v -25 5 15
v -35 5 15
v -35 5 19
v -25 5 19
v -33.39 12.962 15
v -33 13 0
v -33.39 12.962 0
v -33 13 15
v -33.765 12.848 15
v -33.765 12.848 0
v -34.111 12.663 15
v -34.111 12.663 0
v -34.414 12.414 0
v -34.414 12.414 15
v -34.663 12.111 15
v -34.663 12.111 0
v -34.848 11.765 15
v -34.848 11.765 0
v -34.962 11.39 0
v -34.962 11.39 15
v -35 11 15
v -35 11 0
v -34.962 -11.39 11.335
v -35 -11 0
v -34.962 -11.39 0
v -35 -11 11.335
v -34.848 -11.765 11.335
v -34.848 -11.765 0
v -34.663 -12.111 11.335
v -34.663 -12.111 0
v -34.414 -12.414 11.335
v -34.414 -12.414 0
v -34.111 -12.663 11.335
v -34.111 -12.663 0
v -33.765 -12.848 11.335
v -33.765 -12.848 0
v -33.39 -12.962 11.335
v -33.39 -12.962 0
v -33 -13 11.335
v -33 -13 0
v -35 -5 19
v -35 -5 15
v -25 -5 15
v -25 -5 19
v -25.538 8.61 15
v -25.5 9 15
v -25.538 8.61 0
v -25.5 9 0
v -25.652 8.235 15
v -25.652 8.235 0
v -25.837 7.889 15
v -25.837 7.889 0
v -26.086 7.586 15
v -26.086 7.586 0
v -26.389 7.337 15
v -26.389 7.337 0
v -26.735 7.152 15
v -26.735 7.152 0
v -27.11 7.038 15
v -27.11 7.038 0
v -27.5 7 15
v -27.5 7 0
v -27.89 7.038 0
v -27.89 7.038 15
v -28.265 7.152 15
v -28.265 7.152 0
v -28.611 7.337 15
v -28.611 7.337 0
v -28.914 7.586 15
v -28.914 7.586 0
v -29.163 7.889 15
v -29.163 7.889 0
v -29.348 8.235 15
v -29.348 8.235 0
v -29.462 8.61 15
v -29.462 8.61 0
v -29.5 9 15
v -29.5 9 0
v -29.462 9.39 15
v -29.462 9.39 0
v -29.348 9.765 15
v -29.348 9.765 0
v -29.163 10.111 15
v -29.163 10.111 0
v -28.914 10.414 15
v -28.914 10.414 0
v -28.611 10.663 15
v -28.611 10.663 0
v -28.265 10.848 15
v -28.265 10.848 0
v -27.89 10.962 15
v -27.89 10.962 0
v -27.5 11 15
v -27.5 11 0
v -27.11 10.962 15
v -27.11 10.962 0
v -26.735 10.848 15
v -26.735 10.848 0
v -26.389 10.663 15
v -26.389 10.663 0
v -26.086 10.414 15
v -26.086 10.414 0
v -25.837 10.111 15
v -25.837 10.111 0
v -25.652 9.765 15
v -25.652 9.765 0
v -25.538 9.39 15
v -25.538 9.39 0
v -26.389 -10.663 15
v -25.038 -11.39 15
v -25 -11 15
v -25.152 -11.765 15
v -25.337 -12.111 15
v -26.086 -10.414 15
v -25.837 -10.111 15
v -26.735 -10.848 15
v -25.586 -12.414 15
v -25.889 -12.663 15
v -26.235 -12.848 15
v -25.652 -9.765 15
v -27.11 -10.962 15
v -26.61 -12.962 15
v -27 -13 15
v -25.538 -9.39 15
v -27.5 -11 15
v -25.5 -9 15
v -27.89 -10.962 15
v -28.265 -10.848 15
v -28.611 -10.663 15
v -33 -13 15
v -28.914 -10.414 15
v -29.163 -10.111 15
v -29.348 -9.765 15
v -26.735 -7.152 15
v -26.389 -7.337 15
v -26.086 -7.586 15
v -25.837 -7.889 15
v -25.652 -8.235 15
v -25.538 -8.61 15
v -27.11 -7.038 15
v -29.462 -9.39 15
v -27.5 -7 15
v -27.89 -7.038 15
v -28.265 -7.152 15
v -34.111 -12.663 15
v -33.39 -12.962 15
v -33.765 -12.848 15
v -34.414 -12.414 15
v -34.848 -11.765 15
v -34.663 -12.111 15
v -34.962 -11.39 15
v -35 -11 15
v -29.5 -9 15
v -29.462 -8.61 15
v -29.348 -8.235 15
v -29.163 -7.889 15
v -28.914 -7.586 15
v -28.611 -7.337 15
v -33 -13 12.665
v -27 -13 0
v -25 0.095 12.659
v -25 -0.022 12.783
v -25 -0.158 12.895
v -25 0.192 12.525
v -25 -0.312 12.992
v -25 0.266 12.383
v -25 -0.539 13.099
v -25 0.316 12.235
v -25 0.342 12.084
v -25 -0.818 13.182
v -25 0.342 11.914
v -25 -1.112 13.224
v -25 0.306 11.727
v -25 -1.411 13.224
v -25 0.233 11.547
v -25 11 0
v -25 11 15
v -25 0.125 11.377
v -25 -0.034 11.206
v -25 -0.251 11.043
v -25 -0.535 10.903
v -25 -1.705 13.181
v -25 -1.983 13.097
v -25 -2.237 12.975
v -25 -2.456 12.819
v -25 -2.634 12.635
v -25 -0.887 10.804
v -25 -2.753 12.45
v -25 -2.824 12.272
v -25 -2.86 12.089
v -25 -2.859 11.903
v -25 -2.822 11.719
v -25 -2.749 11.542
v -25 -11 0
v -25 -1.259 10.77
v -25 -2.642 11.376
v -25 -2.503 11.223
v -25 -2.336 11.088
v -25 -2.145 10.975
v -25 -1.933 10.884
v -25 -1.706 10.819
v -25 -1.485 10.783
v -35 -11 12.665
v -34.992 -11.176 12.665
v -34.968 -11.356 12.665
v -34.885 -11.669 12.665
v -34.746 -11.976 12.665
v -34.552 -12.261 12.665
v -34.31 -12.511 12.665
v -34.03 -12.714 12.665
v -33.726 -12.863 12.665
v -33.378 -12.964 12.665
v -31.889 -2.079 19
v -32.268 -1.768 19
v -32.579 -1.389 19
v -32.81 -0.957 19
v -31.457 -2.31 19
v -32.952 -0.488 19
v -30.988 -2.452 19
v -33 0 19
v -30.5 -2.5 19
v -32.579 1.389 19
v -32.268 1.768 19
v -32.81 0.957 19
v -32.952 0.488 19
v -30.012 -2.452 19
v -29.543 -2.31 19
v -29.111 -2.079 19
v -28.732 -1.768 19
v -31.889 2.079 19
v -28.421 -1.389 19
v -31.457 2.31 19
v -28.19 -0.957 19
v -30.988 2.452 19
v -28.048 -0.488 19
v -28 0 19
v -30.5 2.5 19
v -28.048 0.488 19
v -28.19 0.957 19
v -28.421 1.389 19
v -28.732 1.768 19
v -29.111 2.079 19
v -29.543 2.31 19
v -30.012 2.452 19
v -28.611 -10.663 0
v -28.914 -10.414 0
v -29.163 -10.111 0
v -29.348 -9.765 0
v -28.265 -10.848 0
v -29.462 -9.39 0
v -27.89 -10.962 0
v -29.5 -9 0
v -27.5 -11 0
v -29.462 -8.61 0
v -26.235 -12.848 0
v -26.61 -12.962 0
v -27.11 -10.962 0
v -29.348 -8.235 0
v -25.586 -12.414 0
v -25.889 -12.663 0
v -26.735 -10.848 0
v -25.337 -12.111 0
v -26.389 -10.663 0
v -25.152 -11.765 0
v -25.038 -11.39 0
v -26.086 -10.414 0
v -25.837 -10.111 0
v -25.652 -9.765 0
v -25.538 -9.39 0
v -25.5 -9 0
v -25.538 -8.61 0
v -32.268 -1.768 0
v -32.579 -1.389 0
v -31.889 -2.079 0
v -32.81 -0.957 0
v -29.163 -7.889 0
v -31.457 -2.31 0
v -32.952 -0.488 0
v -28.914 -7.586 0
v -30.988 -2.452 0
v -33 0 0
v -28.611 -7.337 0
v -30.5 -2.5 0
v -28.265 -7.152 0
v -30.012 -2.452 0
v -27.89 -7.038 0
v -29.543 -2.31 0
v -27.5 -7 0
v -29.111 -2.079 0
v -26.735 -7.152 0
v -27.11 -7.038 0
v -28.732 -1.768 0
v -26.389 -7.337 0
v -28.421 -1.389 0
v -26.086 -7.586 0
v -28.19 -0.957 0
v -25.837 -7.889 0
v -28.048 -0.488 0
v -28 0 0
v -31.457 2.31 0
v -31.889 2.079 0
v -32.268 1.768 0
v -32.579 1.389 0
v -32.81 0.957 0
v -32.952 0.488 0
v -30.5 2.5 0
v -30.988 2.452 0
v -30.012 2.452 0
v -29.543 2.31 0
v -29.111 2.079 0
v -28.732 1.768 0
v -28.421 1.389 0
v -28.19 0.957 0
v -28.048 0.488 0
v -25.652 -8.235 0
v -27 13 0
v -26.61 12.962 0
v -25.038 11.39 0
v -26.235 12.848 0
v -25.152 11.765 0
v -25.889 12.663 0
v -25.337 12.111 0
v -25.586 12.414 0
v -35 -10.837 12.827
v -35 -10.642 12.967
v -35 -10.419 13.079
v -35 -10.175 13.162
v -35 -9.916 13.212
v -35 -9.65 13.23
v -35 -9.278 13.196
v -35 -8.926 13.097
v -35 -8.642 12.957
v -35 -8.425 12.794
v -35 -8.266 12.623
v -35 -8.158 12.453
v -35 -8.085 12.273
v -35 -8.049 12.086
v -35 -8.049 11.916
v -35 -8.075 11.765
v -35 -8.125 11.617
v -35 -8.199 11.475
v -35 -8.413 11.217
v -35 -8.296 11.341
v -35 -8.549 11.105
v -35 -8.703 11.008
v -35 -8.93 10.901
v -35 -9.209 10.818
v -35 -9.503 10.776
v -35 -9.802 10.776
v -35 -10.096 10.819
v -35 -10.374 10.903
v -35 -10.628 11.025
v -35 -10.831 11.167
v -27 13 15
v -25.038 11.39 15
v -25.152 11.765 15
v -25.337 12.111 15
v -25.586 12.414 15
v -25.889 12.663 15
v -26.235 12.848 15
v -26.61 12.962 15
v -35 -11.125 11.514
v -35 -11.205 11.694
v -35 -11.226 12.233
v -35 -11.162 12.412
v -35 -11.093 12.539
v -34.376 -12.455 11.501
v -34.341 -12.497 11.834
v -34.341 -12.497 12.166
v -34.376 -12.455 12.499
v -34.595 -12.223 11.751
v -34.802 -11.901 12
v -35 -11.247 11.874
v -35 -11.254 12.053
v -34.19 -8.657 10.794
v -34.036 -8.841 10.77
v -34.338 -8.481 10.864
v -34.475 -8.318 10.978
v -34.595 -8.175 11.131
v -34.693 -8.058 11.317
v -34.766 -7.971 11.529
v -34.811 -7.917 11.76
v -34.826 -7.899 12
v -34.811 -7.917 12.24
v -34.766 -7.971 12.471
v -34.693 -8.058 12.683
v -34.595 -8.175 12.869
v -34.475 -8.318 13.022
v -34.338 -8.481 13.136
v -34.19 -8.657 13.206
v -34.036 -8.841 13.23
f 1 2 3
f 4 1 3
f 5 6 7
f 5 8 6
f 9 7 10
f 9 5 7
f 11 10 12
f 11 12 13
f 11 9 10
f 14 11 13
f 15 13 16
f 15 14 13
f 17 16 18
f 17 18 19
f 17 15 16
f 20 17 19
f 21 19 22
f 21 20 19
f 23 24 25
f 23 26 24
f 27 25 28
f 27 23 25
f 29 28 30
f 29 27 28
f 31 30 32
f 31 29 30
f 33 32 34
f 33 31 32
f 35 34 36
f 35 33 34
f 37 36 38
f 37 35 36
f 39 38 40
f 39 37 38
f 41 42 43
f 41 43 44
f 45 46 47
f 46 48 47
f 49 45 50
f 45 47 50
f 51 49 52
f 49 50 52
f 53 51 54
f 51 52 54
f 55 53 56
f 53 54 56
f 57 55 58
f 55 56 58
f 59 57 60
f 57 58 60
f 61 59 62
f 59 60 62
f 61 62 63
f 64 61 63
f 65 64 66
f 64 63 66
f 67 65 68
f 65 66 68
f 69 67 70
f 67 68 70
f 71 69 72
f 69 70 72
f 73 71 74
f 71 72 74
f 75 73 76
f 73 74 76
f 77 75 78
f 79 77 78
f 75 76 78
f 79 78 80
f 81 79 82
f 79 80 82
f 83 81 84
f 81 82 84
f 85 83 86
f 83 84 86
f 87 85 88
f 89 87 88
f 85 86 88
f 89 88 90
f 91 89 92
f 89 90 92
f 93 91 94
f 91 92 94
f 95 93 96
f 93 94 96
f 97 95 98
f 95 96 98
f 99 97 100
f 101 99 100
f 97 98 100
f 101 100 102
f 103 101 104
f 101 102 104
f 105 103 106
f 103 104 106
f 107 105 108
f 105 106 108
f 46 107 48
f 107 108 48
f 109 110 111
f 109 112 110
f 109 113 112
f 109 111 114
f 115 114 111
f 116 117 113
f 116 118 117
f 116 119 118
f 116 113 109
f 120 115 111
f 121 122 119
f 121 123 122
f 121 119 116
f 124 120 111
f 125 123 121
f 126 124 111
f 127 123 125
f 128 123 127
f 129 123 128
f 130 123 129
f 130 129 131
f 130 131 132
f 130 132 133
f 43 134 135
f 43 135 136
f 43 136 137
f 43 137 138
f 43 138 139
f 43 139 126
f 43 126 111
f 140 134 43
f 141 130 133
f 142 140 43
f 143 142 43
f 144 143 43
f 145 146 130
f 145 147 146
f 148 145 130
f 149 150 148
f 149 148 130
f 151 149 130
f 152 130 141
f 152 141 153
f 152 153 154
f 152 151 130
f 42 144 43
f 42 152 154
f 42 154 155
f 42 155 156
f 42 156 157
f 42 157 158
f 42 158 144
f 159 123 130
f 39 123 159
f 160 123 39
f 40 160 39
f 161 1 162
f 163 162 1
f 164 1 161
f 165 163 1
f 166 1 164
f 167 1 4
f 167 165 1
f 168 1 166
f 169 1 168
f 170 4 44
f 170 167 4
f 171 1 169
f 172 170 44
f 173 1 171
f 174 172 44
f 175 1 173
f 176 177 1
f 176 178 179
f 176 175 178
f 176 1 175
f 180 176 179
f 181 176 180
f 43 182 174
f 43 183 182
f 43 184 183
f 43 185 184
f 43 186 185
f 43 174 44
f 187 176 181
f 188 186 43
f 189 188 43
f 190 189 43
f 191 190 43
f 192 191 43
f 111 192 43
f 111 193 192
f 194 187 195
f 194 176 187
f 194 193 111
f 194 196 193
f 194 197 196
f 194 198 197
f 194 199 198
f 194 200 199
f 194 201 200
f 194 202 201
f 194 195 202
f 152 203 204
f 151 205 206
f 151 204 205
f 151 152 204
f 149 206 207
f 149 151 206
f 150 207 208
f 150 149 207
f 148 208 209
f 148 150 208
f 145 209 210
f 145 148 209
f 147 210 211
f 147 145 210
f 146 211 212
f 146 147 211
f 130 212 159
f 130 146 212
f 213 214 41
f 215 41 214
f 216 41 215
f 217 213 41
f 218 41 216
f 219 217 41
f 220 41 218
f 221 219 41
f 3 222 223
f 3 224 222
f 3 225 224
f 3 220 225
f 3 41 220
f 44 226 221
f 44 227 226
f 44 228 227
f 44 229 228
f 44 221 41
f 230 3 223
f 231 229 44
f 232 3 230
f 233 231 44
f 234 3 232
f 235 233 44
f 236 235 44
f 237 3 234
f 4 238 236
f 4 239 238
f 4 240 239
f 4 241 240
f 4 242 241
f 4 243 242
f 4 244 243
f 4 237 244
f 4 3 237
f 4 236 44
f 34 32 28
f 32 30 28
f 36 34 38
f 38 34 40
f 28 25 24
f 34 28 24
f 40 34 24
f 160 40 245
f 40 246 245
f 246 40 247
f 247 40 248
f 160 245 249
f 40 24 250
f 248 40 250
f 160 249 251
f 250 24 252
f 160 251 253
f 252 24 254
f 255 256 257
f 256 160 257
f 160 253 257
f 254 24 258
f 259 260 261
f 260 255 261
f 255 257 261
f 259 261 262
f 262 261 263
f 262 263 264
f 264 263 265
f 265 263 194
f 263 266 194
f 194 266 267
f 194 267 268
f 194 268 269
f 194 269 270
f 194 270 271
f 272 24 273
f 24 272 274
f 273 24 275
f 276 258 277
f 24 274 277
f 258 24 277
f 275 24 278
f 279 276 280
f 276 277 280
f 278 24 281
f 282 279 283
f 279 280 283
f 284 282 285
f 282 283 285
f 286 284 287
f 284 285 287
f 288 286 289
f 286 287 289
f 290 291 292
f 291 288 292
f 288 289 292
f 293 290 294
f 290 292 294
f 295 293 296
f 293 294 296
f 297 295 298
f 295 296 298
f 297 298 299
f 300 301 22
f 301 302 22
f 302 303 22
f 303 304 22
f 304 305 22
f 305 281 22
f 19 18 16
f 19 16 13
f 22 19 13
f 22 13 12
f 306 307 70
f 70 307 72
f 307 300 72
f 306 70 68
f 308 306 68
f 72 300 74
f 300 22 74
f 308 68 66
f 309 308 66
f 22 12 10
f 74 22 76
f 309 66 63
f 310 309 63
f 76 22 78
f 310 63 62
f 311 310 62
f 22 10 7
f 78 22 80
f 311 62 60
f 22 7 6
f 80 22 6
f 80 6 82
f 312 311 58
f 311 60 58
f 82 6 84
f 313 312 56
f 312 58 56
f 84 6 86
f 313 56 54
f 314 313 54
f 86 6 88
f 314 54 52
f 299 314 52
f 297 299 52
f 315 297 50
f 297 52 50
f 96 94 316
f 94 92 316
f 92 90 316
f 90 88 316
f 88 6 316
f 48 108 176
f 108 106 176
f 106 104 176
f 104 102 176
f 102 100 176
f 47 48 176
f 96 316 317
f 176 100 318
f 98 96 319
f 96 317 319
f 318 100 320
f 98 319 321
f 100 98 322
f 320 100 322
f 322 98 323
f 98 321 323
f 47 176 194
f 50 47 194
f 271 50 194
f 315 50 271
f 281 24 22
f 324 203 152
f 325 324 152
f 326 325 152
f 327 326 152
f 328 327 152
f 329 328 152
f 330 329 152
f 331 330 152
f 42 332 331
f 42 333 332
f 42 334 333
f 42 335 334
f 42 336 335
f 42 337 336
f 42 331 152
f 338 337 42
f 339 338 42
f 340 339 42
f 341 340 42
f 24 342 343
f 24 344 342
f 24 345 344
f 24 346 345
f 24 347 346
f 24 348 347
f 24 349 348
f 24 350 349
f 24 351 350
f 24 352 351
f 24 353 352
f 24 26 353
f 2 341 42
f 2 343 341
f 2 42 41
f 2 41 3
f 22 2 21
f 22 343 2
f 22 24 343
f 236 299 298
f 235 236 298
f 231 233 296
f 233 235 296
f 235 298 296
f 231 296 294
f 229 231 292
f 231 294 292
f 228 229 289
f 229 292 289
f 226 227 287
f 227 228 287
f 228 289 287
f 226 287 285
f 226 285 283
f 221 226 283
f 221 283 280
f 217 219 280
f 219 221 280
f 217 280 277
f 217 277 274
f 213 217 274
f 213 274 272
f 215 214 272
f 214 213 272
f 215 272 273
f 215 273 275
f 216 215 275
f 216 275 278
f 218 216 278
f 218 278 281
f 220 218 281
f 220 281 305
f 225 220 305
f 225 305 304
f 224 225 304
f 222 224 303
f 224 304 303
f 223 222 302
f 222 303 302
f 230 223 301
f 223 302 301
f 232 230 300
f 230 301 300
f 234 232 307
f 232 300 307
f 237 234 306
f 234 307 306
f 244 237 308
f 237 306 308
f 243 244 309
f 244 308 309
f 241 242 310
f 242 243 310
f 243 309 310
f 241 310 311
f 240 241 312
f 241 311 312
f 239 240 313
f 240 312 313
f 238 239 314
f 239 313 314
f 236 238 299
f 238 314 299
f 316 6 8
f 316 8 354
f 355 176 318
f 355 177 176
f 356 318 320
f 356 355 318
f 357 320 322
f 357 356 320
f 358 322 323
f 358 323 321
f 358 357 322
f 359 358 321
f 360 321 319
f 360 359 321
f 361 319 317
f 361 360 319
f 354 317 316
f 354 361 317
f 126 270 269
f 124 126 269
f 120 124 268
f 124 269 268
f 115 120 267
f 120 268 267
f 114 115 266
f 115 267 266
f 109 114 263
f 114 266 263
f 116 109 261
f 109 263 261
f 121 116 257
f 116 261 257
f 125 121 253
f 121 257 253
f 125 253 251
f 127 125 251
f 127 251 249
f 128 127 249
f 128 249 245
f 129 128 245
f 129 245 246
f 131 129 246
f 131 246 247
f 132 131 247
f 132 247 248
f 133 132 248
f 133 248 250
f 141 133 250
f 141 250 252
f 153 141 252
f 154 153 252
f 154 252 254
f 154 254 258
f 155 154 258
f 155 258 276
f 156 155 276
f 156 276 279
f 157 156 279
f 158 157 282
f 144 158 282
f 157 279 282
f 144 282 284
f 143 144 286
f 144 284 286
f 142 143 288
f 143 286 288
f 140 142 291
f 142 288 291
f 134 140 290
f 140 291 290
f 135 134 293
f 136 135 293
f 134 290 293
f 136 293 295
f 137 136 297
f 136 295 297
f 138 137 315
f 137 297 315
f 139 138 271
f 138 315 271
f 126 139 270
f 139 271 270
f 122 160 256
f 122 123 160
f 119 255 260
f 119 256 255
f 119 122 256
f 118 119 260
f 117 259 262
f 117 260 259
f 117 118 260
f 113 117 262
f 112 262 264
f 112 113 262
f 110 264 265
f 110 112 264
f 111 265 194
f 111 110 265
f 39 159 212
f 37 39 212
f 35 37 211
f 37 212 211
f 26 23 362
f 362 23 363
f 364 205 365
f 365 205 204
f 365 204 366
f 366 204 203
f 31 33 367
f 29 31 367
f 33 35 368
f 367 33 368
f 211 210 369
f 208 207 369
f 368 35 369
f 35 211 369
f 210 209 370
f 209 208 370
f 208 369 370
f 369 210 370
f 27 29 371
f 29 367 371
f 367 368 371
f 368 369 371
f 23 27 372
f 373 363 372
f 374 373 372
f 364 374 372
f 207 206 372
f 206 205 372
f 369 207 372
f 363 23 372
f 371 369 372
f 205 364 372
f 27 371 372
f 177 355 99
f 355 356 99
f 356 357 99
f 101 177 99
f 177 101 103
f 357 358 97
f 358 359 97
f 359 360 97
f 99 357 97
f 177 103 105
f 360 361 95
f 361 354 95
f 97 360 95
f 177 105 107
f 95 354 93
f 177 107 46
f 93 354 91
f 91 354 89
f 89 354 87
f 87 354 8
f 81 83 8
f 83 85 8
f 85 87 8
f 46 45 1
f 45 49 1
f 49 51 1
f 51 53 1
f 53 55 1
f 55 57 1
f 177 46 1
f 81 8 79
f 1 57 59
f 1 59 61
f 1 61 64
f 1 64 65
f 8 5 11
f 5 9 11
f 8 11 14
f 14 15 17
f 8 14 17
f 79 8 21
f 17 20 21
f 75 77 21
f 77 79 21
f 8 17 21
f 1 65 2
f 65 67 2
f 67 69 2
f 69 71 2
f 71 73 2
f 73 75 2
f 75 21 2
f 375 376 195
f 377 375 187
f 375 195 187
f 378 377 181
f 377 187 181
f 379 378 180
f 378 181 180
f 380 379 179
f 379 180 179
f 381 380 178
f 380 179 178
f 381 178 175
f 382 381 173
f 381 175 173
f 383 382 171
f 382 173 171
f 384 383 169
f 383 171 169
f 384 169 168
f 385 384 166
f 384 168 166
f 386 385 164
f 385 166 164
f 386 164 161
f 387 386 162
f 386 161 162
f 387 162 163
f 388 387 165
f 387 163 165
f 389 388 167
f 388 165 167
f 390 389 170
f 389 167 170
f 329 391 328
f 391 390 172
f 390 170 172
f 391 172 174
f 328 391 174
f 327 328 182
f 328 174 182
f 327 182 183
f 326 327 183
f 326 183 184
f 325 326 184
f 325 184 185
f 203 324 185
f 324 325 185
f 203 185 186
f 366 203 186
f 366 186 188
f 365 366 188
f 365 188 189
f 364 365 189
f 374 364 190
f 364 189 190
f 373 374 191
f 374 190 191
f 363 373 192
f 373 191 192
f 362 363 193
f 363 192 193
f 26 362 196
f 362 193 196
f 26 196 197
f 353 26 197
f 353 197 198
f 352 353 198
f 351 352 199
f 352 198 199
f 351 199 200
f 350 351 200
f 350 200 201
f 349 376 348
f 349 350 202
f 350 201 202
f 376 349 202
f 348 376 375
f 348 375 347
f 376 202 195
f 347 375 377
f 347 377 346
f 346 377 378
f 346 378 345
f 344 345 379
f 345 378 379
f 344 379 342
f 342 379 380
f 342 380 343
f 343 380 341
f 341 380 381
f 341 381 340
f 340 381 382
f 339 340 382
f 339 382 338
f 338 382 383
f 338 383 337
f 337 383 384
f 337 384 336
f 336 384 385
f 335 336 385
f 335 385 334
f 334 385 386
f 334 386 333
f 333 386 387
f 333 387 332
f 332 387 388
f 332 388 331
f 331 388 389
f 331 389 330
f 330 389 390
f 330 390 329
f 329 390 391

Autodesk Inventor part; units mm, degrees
ref_plane "YZ Plane" through (0, 0, 0) normal (1, 0, 0) x (0, 1, 0)
ref_plane "XZ Plane" through (0, 0, 0) normal (0, 1, 0) x (-1, 0, 0)
ref_plane "Work Plane1" through (0, 0, 0) normal (0, 0, 1) x (1, 0, 0)
sketch "Sketch1" plane through (0, 0, 0) normal (0, 0, 1) x (1, 0, 0)
  circle A0 centre (-27.5, 9) radius 2 projected
  circle A1 centre (-27.5, -9) radius 2 projected
  circle A2 centre (-30.5, 0) radius 2.5 projected
  line L0 (-25, 13) -> (-25, -12.5061)
  line L1 (-35, -13) -> (-35, 13)
  line L2 (-25, -12.5061) -> (-25, -13)
  line L3 (-25, -13) -> (-35, -13)
  line L4 (-35, 13) -> (-25, 13)
  arc A3 (-2.9901, -1.4163) -> (-18.371, -4.3253) centre (-12.371, 6.067) ccw construction
  line L5 (-35, -13) -> (-35, 13) construction
  line L6 (-60.2, 0) -> (60.2, 0) construction
  point P0 (0, 0)
  dimension "d31" = 2.5
  dimension "d37" = 26
ref_plane "Work Plane2" through (-37, -13, 19) normal (0, 0, -1) x (0, 1, 0)
extrude "Extrusion1" add sketch "Sketch1" along normal up to surface (19 mm away)
ref_plane "Work Plane3" through (-0.8627, 0, 12) normal (0, 0, 1) x (1, 0, 0)
sketch "Sketch4" plane through (-0.8627, 0, 12) normal (0, 0, 1) x (1, 0, 0)
  circle A0 centre (-29.6373, 0) radius 2.5 construction
  circle A1 centre (-26.6373, -9) radius 2 construction
  circle A2 centre (-26.6373, 9) radius 2 construction
  line L0 (-34.1373, -13) -> (-24.1373, -13) construction
  line L1 (-24.1373, -13) -> (-24.1373, 13) construction
  line L2 (-24.1373, 13) -> (-34.1373, 13) construction
  line L3 (-34.1373, 13) -> (-34.1373, -13) construction
  line L4 (-24.1373, 13) -> (-24.1373, -13) construction
  line L5 (-24.1373, -3.2174) -> (-34.1373, -11.6084) construction
  line L6 (-34.1373, -13) -> (-34.1373, 13) construction
  line L7 (-24.1373, -1.2593) -> (-34.1373, -9.6503) construction
  line L8 (-24.1373, 0.6988) -> (-34.1373, -7.6922) construction
  line L9 (-23.1842, -0.4595) -> (-35.6373, -10.9089)
  point P0 (0.8627, 0)
  dimension "d7" = 130
  dimension "d8" = 1.5
  dimension "d9" = 1.5
  dimension "d10" = 0.5
  dimension "d13" = 1.5
ref_plane "Work Plane6" through (-35, -7.6922, 12) normal (-0.766, -0.6428, 0) x (0.6428, -0.766, 0)
sketch "Sketch7" plane through (-35, -7.6922, 12) normal (-0.766, -0.6428, 0) x (0.6428, -0.766, 0)
  point P0 (16.605, -12)
  point P1 (1.5, 0)
  point P2 (1.5, 0)
  point P3 (1.5, 0)
hole "Hole1" at (-34.0358, -8.8412, 12) direction (0.766, 0.6428, 0) diameter 2.459 end through all thread size "M3x0.5" class "6H" standard "ISO Metric profile"
hole "Hole2" at (-34.0358, -8.8412, 12) direction (-0.766, -0.6428, 0) diameter 2.459 end through all thread size "M3x0.5" class "6H" standard "ISO Metric profile"
sketch "Sketch9" plane through (-35, -13, 0) normal (-1, 0, 0) x (0, 0, 1)
  line L0 (19, 26) -> (15, 26)
  line L1 (15, 26) -> (15, 18)
  line L2 (15, 18) -> (19, 18)
  line L3 (19, 18) -> (19, 26)
  line L4 (19, 0) -> (15, 0)
  line L5 (15, 0) -> (15, 8)
  line L6 (15, 8) -> (19, 8)
  line L7 (19, 8) -> (19, 0)
  point P0 (0, 13)
  dimension "d32" = 4
  dimension "d33" = 8
extrude "Extrusion2" cut sketch "Sketch9" against normal up to surface (10 mm away)
fillet "Fillet1" radius 2 4 edges at (-25, 13, 7.5) (-35, 13, 7.5) (-35, -13, 7.5) (-25, -13, 7.5)
